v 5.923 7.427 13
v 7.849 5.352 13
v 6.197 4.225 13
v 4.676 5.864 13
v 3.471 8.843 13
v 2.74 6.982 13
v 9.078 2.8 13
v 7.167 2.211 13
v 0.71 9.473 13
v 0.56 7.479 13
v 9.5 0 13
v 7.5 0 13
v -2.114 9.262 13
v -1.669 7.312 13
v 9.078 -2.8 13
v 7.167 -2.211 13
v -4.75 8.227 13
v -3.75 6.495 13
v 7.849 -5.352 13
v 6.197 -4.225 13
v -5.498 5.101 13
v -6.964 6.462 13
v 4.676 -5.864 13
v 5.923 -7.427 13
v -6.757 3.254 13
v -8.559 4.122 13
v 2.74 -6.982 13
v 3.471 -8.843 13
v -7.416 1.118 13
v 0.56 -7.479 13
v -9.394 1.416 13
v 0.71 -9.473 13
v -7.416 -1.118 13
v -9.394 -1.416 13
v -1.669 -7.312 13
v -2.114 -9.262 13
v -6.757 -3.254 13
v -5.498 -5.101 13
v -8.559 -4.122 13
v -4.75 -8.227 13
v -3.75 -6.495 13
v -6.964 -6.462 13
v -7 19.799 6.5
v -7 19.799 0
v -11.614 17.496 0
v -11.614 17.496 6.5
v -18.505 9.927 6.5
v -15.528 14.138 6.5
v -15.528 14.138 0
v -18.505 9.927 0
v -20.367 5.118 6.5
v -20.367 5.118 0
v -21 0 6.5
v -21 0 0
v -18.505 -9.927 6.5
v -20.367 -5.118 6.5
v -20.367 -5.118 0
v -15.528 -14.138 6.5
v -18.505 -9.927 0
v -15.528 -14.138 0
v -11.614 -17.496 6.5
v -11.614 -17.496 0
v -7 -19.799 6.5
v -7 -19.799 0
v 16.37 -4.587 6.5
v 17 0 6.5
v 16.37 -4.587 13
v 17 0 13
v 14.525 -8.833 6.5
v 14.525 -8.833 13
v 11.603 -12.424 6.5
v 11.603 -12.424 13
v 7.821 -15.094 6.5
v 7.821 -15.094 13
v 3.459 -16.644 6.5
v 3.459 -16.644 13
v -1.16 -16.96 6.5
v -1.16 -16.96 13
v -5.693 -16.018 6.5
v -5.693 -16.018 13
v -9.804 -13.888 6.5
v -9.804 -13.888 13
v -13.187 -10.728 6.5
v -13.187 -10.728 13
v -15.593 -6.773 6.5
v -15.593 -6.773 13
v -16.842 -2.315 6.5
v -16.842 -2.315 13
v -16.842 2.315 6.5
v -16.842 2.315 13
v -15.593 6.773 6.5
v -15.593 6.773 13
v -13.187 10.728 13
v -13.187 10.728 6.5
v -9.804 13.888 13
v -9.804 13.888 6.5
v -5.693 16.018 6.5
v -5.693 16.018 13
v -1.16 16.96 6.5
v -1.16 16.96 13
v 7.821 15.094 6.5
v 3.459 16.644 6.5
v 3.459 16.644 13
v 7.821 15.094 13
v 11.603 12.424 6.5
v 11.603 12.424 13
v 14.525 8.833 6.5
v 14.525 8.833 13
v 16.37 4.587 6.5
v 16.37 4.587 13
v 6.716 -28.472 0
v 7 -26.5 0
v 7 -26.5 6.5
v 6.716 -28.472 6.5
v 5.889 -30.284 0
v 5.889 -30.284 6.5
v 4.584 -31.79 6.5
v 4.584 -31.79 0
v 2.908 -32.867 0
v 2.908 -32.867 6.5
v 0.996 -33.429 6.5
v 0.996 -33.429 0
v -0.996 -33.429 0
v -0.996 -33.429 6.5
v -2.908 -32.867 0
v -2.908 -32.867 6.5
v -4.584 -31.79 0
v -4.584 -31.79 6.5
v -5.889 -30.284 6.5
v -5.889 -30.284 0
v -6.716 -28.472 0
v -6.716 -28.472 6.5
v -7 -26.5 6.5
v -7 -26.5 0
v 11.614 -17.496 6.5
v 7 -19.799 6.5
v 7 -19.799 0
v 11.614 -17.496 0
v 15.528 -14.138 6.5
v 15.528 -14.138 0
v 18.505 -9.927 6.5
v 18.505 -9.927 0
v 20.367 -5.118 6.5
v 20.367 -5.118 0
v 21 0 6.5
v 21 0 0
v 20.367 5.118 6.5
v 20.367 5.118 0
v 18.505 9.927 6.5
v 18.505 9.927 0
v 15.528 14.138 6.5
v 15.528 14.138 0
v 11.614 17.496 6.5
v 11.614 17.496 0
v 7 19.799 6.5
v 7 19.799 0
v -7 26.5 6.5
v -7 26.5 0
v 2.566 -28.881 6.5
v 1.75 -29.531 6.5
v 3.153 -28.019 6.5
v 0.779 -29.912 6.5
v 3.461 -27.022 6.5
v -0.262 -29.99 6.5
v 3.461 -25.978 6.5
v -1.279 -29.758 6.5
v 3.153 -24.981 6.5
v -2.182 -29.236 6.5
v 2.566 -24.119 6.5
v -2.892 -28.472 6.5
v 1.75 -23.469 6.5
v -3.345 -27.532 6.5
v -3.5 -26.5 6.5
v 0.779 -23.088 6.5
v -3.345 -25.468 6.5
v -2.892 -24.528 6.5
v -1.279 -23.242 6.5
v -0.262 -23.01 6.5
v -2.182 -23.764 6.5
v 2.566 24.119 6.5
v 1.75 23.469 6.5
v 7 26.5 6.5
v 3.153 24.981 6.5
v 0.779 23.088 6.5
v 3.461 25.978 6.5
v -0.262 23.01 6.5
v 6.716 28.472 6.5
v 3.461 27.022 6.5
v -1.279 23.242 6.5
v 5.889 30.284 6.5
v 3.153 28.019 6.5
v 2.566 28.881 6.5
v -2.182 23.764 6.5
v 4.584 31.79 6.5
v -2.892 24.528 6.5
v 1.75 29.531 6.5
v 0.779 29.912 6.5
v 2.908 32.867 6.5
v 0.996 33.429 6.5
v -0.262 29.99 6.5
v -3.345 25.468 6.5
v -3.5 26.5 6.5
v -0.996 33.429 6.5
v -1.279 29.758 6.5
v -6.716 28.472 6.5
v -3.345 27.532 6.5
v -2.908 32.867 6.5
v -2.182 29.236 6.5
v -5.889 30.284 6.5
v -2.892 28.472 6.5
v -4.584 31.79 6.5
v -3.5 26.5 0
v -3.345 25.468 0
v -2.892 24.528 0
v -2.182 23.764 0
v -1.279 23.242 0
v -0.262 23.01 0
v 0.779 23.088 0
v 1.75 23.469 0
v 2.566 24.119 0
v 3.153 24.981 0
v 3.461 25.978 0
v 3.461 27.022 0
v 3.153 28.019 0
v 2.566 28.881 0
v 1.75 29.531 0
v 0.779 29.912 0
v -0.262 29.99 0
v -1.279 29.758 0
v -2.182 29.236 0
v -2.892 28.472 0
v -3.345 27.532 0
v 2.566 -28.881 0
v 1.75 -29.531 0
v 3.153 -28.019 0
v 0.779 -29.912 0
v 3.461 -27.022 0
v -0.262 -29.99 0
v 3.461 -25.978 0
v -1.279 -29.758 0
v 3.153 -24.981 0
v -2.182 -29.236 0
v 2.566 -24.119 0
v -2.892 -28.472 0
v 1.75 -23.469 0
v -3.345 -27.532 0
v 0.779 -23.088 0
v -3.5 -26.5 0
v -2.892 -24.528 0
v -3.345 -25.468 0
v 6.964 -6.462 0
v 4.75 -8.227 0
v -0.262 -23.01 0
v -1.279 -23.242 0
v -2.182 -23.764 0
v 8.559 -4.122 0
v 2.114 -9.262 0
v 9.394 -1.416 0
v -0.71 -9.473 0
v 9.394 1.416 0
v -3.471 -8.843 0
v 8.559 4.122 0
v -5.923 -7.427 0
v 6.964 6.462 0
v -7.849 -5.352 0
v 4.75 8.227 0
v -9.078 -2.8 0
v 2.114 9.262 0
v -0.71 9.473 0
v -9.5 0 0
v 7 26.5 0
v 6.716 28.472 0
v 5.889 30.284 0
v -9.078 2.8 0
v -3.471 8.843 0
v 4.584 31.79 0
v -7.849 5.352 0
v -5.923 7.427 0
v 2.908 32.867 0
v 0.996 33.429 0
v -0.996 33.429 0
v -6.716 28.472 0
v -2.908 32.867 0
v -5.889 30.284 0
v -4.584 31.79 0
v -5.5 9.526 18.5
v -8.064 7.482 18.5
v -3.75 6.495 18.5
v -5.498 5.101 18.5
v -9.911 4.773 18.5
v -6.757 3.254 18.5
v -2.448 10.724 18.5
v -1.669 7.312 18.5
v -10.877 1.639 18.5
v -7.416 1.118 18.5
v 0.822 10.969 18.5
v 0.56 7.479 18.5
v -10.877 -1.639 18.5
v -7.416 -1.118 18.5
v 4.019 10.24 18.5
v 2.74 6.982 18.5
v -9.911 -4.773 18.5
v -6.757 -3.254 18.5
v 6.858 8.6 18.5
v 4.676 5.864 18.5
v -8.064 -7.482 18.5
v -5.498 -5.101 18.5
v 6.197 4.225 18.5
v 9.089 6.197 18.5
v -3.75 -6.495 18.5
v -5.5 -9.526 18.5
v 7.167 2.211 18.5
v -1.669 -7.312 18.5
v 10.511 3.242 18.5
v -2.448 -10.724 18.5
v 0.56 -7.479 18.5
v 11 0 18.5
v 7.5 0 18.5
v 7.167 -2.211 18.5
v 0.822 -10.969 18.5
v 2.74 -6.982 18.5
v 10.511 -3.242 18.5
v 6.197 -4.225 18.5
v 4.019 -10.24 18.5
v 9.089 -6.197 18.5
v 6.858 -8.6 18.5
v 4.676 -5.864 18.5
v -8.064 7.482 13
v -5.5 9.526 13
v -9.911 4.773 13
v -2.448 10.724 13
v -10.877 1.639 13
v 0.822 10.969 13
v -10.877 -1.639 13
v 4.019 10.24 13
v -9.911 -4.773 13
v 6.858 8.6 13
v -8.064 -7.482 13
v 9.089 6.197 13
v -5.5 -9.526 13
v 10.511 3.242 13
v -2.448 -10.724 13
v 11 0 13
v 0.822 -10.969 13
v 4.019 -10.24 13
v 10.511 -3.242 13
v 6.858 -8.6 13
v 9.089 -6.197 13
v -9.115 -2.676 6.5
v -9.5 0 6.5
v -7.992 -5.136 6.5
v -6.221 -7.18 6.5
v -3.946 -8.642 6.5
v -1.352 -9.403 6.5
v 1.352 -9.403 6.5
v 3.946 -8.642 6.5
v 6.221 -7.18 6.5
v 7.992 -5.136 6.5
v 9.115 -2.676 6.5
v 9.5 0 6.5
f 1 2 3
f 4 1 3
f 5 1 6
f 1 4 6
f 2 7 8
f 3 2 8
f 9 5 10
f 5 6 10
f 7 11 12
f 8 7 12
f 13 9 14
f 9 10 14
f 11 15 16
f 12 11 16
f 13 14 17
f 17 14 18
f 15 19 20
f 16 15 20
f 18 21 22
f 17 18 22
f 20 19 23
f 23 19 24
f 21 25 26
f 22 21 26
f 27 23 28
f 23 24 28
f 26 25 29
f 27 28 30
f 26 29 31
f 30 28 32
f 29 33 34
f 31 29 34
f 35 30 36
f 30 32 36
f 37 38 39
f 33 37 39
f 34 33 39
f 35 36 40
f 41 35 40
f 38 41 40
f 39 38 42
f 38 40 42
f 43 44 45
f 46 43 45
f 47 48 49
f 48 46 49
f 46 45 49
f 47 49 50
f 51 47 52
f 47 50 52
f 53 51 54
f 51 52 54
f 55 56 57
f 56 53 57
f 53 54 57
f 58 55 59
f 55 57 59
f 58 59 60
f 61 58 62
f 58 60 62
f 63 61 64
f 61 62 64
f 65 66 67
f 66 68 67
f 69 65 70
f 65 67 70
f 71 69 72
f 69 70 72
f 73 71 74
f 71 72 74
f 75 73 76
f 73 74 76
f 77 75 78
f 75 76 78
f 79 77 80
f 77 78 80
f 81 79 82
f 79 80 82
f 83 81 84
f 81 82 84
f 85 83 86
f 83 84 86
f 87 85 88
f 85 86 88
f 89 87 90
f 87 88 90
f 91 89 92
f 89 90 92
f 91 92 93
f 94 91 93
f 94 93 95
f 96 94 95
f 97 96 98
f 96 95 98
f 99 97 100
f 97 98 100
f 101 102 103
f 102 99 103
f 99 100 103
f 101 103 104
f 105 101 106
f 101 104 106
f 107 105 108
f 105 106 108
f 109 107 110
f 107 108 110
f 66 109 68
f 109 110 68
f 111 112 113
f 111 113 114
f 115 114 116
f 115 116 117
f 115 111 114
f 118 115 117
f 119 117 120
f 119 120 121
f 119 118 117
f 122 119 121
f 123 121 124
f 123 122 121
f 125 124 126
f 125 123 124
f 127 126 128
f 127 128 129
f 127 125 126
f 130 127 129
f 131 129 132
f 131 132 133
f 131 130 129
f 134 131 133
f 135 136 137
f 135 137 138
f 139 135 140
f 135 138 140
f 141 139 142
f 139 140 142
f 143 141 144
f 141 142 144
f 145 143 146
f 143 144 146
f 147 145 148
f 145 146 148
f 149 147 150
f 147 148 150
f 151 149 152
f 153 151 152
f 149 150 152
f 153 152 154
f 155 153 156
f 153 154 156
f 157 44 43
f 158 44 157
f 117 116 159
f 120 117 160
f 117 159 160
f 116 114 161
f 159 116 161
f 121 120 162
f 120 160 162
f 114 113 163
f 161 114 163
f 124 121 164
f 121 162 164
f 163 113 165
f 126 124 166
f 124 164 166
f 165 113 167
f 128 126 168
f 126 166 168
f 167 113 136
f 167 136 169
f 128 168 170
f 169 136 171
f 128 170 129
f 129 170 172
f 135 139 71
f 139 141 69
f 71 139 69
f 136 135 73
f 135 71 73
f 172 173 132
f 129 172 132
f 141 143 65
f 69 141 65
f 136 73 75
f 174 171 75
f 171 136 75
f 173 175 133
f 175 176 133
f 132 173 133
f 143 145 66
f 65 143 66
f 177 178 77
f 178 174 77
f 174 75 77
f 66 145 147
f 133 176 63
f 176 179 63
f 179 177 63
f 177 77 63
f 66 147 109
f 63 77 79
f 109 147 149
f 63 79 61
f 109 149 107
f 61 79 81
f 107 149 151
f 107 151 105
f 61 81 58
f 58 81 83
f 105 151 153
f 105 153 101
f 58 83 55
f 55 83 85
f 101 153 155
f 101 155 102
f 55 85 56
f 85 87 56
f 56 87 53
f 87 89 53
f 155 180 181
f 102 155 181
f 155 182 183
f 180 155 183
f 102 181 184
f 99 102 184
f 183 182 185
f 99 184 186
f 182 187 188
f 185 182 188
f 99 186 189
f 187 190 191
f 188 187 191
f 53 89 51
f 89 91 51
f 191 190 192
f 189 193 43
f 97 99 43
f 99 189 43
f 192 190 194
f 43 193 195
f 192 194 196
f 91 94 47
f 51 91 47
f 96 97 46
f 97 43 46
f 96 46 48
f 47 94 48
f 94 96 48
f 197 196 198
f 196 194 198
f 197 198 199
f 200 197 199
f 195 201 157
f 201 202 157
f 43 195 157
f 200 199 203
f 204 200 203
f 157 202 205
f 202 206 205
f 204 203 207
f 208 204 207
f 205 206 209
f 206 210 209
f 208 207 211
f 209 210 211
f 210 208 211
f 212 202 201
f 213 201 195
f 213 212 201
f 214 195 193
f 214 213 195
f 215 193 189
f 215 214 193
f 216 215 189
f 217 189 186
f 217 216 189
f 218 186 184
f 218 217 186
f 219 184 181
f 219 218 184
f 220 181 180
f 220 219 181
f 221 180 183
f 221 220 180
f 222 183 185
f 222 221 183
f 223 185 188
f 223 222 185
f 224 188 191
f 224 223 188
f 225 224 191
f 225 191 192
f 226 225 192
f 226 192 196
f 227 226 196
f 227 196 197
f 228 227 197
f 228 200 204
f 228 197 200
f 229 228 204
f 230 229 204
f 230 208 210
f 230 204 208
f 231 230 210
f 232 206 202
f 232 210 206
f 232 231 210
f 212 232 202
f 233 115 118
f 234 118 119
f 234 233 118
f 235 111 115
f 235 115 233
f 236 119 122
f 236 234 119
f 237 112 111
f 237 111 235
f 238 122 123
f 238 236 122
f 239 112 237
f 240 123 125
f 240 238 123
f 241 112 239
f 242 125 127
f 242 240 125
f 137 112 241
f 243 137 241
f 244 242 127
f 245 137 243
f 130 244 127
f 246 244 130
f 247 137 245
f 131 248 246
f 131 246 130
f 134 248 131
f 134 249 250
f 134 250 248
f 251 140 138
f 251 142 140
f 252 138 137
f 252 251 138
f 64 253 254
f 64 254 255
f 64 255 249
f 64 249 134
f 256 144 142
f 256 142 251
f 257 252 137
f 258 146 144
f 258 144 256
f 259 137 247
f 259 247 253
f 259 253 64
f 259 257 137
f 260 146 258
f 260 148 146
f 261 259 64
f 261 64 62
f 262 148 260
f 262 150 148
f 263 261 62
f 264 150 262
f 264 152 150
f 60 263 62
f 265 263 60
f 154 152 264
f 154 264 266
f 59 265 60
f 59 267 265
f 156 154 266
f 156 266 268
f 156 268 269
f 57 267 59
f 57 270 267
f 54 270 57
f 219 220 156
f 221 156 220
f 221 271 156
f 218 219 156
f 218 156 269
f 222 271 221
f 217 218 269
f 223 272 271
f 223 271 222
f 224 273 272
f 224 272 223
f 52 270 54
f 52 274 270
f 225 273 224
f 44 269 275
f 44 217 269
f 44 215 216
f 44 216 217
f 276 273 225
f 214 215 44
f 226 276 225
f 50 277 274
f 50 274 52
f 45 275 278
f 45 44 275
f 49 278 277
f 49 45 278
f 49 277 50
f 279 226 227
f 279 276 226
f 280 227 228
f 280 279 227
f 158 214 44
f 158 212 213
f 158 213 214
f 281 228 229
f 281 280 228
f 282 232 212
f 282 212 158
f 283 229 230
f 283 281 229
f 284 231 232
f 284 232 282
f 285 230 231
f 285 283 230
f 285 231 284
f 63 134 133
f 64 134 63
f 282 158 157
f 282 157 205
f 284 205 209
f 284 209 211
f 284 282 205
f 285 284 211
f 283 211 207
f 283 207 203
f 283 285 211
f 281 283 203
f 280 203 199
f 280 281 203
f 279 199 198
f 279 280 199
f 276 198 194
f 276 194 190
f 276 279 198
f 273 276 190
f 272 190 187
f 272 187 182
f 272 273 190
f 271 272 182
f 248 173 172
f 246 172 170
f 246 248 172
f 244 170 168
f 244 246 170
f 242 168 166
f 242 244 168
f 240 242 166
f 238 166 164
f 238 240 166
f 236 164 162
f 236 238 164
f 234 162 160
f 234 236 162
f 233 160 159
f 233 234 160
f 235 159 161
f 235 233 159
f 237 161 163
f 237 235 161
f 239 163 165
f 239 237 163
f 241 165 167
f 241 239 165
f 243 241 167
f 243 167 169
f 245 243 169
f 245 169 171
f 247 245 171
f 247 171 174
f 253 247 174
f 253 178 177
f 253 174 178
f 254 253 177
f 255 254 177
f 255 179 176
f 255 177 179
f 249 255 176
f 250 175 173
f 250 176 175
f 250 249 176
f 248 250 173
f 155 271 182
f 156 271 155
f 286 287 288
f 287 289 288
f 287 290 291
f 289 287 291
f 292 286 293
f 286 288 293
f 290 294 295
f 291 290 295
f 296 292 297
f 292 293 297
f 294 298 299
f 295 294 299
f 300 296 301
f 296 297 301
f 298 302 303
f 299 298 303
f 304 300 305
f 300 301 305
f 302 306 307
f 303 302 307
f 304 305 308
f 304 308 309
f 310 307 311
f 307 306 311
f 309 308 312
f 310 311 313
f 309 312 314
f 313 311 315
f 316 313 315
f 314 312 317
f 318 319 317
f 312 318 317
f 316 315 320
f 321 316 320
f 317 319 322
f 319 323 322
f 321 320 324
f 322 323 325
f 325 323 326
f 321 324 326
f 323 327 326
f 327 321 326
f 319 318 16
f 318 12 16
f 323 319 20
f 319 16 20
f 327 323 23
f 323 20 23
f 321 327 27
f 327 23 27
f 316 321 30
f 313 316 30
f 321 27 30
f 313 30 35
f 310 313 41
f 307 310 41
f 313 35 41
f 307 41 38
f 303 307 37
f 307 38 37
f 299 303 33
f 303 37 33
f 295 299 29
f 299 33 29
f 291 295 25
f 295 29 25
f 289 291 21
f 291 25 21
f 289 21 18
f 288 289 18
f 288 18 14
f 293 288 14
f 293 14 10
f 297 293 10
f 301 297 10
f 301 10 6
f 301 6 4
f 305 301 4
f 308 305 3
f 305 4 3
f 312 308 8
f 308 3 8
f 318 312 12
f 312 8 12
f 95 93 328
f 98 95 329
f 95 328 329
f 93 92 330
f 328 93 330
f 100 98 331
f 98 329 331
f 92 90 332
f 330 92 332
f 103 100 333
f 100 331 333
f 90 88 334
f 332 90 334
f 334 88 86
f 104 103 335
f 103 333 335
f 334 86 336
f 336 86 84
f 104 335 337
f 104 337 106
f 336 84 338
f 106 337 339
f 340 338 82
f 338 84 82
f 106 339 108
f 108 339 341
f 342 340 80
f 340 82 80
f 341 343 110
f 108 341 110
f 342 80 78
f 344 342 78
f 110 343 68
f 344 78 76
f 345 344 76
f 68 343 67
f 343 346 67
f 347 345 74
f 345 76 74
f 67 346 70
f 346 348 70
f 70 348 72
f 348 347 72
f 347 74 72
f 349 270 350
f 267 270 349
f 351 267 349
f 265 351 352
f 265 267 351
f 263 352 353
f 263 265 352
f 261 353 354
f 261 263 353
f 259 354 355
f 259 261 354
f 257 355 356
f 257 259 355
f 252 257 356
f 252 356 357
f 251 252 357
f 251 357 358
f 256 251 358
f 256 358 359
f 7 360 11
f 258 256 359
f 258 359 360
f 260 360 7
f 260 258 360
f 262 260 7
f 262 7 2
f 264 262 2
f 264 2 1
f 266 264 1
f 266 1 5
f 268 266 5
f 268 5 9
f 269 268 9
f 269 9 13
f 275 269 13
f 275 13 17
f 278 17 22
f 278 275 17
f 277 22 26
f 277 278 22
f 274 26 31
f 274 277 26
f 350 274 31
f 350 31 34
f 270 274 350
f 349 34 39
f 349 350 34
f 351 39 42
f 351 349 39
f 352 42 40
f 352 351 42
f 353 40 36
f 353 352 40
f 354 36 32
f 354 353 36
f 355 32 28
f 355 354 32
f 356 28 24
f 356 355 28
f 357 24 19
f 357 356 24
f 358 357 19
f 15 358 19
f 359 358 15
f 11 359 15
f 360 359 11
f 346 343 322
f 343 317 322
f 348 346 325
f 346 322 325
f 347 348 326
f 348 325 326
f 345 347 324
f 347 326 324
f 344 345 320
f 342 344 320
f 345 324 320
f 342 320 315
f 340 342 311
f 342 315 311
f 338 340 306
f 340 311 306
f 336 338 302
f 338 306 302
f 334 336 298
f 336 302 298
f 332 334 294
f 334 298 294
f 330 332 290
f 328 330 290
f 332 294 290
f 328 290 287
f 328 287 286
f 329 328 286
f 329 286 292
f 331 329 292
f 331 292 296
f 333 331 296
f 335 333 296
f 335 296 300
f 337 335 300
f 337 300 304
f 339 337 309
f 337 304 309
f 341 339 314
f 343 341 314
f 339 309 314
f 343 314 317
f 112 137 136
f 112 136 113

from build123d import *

# Parameters (mm, degrees)
SKETCH_1_R          = 21
EXTRUDE_2_DEPTH     = 6.5
EXTRUDE_4_DEPTH     = 6.5
SKETCH_3_R          = 9.5
SKETCH_3_R_2        = 3.5
CUT_EXTRUDE_1_DEPTH = 41.068691019


with BuildPart() as part:
    # 草图1 → 凸台-拉伸2 (new body)
    with BuildSketch(Plane.XY):
        with Locations(Location((0, 0, 0), (0, 0, 180))):
            Circle(SKETCH_1_R)
    extrude(amount=EXTRUDE_2_DEPTH)

    # 草图2 → 凸台-拉伸4 (add)
    with BuildSketch(Plane.XY):
        with BuildLine():
            Line((-7, -26.5), (-7, 26.5))
            ThreePointArc((-7, 26.5), (0, 33.5), (7, 26.5))
            Line((7, 26.5), (7, -26.5))
            ThreePointArc((7, -26.5), (0, -33.5), (-7, -26.5))
        make_face()
    extrude(amount=EXTRUDE_4_DEPTH)

    # 草图3 → 切除-拉伸1 (cut, through all)
    with BuildSketch(Plane.XY):
        with Locations(Location((0, 0, 0), (0, 0, 180))):
            Circle(SKETCH_3_R)
        with Locations(Location((0, -26.5, 0), (0, 0, 180))):
            Circle(SKETCH_3_R_2)
        with Locations(Location((0, 26.5, 0), (0, 0, 180))):
            Circle(SKETCH_3_R_2)
    extrude(amount=CUT_EXTRUDE_1_DEPTH, mode=Mode.SUBTRACT)

    # 草图4 → 旋转1 (revolve)
    with BuildSketch(Plane(origin=(0, 0, 0), x_dir=(0, 0, -1), z_dir=(1, 0, 0)), mode=Mode.PRIVATE) as revolve_1_sk:
        Polygon((0, 9.5), (0, 17), (-13, 17), (-13, 11), (-18.5, 11), (-18.5, 7.5), (-13, 7.5), (-13, 9.5), align=None)
    revolve(revolve_1_sk.sketch.rotate(Axis((0, 0, 23.5), (0, 0, -1)), 90), axis=Axis((0, 0, 23.5), (0, 0, -1)))


solid = part.part
